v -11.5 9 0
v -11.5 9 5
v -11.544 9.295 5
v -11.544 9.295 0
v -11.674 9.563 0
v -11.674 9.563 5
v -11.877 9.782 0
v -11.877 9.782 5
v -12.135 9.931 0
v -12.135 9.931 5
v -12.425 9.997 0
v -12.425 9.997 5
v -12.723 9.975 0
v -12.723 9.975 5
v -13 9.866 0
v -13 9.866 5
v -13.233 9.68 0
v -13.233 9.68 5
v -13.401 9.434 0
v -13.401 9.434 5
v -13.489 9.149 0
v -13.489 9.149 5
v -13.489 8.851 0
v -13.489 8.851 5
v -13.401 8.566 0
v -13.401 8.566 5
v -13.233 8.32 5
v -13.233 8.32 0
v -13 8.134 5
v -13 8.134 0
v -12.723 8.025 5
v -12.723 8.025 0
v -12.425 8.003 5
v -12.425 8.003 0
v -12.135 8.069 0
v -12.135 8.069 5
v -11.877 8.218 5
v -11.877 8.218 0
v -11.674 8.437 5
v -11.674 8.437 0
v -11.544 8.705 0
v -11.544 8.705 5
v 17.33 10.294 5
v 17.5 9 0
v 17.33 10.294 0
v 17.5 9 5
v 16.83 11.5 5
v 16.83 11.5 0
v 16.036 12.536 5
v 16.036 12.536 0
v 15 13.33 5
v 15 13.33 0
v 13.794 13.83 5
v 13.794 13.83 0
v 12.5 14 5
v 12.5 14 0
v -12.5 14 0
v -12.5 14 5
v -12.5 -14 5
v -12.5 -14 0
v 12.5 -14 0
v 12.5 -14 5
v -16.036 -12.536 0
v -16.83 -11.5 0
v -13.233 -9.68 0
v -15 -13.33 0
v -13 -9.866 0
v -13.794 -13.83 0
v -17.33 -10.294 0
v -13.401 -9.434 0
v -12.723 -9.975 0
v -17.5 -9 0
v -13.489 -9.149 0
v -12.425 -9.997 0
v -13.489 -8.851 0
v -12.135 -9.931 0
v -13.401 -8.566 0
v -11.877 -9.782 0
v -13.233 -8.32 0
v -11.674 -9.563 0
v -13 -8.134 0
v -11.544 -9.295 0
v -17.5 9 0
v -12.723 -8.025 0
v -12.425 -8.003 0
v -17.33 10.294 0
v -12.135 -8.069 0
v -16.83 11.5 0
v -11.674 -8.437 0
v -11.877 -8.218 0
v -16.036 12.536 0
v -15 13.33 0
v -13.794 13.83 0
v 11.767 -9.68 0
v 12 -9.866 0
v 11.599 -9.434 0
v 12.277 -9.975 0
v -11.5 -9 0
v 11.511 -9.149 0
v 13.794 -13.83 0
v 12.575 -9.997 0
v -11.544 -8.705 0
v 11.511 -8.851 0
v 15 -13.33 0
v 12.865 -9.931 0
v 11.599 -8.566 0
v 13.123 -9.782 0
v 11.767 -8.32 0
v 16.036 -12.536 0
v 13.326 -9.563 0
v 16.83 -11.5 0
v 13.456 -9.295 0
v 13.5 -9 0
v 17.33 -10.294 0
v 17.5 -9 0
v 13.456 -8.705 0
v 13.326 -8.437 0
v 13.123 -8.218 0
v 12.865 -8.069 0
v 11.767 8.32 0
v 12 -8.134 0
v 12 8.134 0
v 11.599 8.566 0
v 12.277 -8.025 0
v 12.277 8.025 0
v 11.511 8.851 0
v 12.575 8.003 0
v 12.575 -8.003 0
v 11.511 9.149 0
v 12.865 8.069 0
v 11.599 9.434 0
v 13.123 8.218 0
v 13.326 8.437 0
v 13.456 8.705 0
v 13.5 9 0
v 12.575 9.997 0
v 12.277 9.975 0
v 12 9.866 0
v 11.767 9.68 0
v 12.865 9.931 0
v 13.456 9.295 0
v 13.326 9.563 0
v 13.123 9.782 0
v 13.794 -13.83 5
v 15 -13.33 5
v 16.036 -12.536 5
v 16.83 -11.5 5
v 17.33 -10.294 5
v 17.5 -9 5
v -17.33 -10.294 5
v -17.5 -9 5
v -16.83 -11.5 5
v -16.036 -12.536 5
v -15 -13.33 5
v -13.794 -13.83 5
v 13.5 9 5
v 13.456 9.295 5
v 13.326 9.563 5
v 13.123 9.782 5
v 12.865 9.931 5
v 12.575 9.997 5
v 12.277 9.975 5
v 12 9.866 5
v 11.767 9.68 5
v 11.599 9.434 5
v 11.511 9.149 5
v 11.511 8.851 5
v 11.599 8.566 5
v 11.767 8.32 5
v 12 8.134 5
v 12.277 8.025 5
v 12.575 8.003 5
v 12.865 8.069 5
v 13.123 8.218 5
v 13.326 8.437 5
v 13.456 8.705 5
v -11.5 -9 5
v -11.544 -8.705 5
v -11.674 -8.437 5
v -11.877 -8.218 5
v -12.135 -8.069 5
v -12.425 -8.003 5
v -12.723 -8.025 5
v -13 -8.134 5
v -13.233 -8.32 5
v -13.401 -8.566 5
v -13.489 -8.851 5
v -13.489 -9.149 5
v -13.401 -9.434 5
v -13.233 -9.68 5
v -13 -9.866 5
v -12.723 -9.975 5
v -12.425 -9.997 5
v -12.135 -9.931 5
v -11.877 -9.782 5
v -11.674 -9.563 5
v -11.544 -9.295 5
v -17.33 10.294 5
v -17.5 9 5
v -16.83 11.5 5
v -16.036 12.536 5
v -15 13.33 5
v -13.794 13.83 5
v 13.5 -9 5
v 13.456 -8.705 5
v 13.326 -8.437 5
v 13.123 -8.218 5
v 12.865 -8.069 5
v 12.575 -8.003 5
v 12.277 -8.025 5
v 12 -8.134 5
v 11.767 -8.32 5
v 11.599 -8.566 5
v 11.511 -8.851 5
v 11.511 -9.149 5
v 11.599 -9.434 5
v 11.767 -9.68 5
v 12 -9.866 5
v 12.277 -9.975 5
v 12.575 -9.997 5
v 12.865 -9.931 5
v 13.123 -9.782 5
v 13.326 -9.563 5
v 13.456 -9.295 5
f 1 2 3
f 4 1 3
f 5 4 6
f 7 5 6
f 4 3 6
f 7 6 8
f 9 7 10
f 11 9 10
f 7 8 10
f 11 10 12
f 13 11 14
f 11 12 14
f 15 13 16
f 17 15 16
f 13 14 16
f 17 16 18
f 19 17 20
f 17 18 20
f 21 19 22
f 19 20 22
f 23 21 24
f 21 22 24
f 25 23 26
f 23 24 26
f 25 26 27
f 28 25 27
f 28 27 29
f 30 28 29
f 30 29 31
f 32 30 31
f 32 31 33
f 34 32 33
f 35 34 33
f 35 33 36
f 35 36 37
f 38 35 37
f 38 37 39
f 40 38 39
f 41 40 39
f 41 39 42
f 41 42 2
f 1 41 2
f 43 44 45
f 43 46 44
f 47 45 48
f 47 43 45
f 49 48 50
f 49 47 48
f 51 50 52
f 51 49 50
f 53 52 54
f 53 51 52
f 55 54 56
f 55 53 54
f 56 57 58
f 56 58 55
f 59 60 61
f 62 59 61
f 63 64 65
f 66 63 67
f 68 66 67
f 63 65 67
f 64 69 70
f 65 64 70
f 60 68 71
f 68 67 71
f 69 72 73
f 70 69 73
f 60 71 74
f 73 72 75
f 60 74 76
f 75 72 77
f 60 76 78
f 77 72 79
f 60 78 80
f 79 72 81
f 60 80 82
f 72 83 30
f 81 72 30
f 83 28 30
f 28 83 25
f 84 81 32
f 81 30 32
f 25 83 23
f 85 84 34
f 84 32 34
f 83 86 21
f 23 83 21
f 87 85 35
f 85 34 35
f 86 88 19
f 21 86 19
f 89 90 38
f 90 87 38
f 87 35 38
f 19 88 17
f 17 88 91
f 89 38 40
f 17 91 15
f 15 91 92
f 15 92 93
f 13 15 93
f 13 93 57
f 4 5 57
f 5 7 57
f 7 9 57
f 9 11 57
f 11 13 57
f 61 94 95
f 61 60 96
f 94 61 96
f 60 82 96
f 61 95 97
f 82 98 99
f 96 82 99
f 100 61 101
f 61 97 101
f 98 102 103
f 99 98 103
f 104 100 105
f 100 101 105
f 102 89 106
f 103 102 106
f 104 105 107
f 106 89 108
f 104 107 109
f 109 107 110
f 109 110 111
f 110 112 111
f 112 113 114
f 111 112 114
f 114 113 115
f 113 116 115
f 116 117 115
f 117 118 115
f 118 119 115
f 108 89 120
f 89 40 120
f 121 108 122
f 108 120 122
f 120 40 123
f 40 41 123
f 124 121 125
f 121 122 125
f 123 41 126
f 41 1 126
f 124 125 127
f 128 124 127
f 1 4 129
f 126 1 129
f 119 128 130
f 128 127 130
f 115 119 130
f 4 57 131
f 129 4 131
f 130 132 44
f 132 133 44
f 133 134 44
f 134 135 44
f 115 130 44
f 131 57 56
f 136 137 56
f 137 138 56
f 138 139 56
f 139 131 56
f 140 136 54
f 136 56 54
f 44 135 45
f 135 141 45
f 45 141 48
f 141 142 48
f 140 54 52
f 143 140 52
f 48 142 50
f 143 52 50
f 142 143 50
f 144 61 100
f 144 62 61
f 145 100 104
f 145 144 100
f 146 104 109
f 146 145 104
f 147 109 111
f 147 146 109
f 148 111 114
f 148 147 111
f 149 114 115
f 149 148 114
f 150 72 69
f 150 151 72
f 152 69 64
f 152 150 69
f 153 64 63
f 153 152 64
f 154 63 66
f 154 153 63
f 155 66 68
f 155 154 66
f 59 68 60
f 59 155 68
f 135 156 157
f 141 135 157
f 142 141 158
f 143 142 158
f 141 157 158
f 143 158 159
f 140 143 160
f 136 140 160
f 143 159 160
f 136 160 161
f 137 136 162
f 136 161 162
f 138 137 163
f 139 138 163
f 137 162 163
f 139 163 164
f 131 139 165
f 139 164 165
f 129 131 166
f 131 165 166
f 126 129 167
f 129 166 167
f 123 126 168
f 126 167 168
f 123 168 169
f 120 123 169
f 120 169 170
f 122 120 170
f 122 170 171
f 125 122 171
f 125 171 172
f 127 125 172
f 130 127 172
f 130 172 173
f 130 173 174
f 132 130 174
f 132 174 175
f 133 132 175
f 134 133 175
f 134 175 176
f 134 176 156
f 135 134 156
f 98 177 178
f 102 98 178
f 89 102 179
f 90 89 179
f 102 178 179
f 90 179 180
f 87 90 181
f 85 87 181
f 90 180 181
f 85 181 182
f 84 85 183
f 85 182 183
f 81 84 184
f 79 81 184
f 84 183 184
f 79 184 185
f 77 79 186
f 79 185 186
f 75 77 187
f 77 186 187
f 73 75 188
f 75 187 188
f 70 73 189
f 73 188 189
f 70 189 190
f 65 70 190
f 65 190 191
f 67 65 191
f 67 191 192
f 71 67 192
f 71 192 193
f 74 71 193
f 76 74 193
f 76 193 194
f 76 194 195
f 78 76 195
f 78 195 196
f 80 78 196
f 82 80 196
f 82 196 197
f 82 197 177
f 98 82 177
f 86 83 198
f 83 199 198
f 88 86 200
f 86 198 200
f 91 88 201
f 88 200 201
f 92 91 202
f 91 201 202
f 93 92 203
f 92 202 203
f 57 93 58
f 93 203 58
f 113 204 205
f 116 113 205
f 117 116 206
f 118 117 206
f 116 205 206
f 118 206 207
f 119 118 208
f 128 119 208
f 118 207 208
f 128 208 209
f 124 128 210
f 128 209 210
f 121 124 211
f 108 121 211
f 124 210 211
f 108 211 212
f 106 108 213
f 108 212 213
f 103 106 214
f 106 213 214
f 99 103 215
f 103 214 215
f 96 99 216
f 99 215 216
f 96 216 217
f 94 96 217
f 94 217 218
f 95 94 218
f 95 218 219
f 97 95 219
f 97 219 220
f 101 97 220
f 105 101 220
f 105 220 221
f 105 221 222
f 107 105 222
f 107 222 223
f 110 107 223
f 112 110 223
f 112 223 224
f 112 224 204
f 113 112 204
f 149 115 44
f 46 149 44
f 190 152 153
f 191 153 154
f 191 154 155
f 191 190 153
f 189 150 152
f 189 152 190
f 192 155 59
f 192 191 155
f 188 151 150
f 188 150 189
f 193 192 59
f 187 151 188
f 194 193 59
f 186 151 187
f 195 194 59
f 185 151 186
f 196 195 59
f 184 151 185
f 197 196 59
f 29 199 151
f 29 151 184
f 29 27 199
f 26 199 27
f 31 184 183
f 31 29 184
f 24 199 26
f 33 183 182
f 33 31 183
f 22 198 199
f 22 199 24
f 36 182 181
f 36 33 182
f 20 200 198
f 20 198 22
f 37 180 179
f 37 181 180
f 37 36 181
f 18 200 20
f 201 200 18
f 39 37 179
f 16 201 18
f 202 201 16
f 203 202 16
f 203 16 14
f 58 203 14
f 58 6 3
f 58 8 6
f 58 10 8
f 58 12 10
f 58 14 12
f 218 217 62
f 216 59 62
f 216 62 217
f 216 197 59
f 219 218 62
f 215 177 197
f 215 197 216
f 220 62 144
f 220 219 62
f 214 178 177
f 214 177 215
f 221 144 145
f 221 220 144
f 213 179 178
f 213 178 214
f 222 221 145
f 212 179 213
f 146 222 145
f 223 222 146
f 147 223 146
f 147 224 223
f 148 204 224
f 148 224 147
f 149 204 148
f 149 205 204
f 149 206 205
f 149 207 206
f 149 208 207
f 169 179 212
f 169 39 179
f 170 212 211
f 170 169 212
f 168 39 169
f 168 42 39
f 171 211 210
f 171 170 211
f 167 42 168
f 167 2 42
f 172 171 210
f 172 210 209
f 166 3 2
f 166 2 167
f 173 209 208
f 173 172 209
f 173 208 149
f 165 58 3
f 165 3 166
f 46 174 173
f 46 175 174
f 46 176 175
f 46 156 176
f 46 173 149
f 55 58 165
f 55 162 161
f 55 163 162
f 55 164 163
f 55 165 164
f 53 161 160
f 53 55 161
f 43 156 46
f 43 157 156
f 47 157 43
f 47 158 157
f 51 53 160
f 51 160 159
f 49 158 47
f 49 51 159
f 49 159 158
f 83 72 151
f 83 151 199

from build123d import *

# Parameters (mm, degrees)
SKETCH1_W           = 35
SKETCH1_H           = 28
BOSS_EXTRUDE1_DEPTH = 5
FILLET1_R           = 5
SKETCH2_R           = 1
CUT_EXTRUDE1_DEPTH  = 23.961925006


with BuildPart() as part:
    # Sketch1 → Boss-Extrude1 (new body)
    with BuildSketch(Plane.XY):
        Rectangle(SKETCH1_W, SKETCH1_H)
    extrude(amount=BOSS_EXTRUDE1_DEPTH)

    # Fillet1
    fillet1_edges = [part.edges().sort_by_distance(p)[0] for p in [
        (17.5, 14, 2.5),
        (17.5, -14, 2.5),
        (-17.5, -14, 2.5),
        (-17.5, 14, 2.5),
    ]]
    fillet(fillet1_edges, radius=FILLET1_R)

    # Sketch2 → Cut-Extrude1 (cut, through all)
    with BuildSketch(Plane.XY.offset(5)):
        with Locations((-12.5, -9)):
            Circle(SKETCH2_R)
        with Locations((-12.5, 9)):
            Circle(SKETCH2_R)
        with Locations((12.5, 9)):
            Circle(SKETCH2_R)
        with Locations((12.5, -9)):
            Circle(SKETCH2_R)
    extrude(amount=-CUT_EXTRUDE1_DEPTH, mode=Mode.SUBTRACT)


solid = part.part
